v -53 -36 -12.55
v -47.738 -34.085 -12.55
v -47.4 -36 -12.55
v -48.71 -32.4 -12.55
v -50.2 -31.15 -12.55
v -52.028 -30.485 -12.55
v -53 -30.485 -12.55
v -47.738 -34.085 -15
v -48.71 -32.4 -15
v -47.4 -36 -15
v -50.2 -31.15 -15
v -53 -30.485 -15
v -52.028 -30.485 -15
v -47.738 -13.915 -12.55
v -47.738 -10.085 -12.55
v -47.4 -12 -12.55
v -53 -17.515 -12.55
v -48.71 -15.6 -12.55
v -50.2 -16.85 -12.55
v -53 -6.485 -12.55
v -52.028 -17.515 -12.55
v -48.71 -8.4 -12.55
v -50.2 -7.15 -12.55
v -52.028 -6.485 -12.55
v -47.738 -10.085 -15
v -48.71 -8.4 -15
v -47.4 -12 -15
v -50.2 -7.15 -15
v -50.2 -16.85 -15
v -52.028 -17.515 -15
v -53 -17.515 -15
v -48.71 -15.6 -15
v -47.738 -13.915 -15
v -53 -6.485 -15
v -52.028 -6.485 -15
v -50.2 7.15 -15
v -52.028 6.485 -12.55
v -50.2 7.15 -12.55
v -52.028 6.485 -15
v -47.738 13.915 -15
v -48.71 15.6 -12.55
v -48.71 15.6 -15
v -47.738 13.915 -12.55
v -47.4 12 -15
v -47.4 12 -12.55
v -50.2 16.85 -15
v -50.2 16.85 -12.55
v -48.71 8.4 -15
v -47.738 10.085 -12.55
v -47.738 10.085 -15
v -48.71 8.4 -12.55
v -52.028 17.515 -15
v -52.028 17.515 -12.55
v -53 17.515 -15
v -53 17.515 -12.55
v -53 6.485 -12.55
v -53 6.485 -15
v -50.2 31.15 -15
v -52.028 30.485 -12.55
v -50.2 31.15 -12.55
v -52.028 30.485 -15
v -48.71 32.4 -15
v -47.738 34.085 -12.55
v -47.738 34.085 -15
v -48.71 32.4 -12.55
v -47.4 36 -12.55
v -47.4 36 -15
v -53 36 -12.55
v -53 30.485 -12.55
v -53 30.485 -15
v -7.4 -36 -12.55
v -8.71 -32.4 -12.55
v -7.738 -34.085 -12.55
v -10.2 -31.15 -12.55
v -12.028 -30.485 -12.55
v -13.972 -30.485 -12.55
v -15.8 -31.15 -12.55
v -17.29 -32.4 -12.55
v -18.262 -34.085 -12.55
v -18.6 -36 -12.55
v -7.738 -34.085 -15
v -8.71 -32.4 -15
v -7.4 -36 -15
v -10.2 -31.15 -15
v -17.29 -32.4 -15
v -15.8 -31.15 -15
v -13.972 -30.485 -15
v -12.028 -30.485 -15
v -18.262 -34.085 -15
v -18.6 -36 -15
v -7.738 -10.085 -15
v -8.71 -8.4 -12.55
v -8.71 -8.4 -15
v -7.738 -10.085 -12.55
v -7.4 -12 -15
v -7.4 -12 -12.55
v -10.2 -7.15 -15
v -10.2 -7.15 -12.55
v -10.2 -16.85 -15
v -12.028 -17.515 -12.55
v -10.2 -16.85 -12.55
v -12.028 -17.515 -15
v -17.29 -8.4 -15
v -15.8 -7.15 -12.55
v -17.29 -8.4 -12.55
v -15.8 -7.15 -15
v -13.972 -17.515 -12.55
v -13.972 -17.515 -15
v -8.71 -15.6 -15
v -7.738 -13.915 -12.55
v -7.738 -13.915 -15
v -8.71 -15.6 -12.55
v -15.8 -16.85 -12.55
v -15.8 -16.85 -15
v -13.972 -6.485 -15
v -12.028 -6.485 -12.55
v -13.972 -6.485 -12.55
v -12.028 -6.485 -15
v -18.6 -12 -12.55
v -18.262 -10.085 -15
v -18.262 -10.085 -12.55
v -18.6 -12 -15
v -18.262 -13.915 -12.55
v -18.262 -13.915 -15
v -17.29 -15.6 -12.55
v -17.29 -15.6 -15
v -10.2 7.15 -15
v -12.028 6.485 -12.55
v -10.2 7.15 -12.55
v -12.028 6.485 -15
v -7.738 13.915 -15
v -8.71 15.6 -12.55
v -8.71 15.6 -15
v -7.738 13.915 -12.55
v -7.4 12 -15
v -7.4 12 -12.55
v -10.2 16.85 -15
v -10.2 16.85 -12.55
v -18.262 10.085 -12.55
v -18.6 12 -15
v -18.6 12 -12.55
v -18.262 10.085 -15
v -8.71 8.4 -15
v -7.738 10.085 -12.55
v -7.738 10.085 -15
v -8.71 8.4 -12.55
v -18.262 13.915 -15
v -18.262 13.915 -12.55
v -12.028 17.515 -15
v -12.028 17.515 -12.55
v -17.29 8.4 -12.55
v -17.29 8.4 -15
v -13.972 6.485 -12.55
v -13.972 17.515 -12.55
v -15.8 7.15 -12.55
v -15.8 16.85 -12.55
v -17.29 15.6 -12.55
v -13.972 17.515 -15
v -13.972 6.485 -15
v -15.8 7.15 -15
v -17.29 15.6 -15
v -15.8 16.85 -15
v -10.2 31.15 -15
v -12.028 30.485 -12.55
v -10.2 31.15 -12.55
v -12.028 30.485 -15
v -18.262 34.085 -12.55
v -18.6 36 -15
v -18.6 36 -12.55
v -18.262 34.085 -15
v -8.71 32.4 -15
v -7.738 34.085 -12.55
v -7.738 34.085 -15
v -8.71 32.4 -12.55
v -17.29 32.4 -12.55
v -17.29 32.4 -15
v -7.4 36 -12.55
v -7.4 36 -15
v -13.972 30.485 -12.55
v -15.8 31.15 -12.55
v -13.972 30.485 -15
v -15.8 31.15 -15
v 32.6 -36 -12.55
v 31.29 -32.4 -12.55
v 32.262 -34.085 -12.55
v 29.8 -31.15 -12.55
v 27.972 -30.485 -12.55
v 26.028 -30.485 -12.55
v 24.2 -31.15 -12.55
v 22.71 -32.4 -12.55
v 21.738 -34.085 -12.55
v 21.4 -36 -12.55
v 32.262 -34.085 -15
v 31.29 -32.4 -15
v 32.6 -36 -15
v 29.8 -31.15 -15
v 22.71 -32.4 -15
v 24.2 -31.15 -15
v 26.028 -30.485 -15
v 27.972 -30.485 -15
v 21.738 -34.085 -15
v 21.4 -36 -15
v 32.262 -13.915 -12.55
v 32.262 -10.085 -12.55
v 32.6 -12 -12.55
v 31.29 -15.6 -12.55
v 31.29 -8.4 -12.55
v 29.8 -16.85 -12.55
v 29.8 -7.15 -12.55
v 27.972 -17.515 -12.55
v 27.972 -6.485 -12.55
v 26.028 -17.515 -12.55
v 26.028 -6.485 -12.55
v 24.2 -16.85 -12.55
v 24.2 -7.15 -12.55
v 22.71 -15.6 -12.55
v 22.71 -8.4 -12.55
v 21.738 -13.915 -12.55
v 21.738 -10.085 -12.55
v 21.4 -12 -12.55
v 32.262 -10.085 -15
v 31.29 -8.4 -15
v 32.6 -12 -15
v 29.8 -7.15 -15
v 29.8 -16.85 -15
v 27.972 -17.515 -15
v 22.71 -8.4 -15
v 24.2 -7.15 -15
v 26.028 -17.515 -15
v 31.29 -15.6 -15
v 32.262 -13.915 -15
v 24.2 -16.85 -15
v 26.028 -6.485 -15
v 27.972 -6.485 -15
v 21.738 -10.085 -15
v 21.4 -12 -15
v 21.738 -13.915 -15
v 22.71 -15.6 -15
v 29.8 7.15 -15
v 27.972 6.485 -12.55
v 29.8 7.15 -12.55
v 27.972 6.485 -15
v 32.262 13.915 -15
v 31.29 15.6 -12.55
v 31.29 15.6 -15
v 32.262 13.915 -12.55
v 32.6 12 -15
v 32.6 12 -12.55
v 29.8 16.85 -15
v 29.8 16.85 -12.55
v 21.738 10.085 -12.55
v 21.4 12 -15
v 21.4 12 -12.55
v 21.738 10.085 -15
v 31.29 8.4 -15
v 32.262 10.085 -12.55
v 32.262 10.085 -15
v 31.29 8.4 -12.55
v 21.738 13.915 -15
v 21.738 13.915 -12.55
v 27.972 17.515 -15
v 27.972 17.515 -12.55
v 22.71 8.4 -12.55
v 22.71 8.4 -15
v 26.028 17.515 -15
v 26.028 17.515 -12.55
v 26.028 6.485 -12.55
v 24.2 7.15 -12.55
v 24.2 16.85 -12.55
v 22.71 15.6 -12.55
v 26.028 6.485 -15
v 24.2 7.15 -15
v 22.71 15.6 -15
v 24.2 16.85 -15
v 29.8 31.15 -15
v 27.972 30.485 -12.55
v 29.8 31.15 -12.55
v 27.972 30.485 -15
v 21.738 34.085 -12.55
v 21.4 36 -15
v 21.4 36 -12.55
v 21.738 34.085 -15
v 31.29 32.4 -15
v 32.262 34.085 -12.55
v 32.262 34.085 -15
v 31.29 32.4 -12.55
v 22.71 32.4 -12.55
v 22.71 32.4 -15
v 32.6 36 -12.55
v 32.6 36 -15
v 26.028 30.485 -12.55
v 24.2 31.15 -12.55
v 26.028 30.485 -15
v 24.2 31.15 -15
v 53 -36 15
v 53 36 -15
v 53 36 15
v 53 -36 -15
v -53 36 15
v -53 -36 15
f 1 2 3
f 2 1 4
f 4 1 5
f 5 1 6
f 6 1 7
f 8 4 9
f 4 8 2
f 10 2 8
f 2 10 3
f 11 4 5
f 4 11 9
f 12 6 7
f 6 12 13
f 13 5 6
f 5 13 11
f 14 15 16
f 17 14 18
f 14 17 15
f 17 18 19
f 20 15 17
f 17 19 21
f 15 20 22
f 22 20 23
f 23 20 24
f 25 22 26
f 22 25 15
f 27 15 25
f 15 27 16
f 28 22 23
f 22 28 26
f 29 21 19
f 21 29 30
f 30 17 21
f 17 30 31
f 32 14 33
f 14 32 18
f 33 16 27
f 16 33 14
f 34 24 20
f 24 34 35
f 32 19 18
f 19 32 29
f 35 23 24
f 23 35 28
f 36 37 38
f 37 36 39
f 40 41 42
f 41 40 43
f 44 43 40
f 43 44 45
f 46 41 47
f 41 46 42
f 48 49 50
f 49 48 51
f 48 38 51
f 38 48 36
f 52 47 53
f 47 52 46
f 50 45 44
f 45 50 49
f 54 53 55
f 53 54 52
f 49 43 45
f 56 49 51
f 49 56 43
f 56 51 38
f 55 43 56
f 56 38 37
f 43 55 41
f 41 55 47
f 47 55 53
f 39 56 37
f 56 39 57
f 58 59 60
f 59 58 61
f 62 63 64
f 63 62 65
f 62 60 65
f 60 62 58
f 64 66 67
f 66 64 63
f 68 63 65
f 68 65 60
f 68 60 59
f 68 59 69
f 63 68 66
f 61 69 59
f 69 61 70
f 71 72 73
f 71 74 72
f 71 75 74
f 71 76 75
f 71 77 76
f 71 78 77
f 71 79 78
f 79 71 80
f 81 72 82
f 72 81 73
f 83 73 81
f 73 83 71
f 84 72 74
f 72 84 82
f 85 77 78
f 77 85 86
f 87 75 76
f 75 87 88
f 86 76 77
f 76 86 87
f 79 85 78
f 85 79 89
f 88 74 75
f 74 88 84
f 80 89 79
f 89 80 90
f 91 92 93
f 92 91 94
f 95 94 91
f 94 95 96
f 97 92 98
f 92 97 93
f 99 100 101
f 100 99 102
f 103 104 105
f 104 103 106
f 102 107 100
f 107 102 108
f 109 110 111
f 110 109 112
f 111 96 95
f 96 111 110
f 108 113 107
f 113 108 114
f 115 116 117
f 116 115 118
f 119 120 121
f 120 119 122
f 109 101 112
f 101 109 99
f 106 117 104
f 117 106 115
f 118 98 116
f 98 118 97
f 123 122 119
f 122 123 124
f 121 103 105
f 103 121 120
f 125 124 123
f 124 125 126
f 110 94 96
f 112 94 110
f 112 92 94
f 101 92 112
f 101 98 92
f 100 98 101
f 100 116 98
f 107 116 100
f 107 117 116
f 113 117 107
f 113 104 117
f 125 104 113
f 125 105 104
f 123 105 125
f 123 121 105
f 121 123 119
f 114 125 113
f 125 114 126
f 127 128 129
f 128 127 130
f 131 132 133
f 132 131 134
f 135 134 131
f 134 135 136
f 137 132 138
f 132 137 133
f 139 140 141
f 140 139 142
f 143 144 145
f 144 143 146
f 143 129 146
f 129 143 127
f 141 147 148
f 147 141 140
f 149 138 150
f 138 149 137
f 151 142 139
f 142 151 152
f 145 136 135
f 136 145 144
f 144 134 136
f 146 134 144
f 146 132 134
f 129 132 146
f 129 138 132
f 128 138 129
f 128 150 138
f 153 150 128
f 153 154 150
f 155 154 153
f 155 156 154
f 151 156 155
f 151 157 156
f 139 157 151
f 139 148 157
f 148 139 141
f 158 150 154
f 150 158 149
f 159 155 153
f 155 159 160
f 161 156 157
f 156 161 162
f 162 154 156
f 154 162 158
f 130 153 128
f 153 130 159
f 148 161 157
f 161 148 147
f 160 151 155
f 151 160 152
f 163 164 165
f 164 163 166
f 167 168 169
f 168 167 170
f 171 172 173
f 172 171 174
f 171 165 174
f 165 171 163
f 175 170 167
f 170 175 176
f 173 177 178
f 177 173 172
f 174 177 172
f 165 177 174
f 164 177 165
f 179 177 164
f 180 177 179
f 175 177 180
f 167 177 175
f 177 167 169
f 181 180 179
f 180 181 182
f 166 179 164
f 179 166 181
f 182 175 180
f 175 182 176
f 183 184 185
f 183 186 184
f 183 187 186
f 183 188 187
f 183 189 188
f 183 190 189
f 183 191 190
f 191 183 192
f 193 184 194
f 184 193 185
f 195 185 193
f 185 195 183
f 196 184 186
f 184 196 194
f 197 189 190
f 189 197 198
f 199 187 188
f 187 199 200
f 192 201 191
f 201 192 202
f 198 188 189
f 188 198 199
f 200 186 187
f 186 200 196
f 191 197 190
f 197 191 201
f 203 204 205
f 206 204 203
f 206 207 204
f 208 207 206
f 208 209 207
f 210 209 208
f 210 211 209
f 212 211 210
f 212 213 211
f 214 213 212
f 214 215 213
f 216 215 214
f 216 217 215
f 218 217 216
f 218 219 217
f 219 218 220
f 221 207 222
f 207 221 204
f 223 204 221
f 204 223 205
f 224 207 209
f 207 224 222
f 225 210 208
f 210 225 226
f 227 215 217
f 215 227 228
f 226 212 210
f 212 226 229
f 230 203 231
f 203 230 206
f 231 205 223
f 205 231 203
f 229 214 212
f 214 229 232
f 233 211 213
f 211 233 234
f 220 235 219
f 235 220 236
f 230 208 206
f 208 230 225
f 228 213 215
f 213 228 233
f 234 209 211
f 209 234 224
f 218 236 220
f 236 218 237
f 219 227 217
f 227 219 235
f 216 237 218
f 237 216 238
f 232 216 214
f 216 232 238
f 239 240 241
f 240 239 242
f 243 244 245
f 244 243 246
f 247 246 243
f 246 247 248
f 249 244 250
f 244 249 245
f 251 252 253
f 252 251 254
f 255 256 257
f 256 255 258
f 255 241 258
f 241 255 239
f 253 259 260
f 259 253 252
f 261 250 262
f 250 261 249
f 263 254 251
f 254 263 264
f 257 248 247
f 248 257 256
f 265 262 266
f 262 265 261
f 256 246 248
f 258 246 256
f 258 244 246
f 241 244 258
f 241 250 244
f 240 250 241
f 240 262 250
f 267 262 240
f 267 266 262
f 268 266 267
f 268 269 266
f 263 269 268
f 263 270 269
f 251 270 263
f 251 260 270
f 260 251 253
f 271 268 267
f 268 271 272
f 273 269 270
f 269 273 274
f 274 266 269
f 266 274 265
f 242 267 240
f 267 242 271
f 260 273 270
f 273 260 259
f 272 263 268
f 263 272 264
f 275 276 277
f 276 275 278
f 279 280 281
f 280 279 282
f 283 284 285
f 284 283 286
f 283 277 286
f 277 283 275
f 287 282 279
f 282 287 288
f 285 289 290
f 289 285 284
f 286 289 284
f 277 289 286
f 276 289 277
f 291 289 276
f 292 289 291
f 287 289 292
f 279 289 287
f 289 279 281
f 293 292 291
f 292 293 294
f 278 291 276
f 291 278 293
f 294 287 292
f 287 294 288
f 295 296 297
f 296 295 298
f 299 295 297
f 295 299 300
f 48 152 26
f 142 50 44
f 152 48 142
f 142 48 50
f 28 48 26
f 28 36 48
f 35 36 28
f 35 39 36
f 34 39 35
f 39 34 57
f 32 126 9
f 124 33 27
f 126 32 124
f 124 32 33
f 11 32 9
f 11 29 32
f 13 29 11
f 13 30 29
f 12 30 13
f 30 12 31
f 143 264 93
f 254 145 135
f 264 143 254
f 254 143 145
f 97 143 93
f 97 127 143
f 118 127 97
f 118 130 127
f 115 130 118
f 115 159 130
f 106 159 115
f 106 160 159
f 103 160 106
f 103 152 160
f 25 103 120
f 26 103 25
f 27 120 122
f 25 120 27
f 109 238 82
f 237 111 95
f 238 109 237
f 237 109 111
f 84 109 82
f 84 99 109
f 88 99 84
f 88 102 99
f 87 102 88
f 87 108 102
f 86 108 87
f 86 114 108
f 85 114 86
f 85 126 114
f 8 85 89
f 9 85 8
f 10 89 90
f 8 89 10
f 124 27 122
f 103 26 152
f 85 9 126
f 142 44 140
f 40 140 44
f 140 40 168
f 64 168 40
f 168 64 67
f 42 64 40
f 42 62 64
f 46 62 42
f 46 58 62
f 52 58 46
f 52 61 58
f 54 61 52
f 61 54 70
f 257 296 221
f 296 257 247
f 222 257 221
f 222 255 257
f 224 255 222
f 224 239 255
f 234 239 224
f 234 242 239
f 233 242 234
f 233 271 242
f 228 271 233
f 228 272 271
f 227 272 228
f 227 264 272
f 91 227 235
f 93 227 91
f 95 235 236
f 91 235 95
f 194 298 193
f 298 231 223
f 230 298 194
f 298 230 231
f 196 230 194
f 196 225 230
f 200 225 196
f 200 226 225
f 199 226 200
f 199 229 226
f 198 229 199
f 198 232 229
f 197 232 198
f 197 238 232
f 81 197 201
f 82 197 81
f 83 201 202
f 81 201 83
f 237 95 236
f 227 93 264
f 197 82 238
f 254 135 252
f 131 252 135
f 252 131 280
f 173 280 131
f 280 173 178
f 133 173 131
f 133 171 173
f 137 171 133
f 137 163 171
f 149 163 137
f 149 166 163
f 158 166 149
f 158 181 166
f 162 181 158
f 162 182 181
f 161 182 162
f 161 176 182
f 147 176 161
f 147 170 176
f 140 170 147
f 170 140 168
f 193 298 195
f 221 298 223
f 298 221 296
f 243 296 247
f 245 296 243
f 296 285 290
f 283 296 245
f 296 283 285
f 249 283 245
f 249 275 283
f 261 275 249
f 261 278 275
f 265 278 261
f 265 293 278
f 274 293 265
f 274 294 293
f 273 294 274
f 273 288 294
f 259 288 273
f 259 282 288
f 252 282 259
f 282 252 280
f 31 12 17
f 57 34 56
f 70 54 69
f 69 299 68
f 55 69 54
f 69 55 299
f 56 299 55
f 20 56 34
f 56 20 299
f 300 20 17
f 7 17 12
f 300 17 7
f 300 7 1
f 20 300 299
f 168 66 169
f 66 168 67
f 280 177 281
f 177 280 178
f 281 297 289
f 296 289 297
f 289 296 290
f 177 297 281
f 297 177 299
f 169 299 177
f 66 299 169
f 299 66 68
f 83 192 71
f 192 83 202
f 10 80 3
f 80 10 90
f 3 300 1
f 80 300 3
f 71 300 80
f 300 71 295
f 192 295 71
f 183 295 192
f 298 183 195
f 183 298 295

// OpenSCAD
// Bench Rack for 1.5 mL Microcentrifuge Tubes
// Dimensions based on user specifications (mm)

// Block dimensions
$X_LEN = 106;
$Y_WID = 72;
$Z_TALL = 30;

// Grid parameters
$HOLE_COUNT_X = 6; // Along X axis
$HOLE_COUNT_Y = 4; // Along Y axis (rows)
$CC_SPACING_X = 16; // Centre-to-centre spacing along X
$CC_SPACING_Y = 16; // Centre-to-centre spacing along Y

// Hole parameters
$HOLE_DIAMETER = 11.2;
$HOLE_DEPTH = 25;   // Depth of the hole (open at top)
$FLOOR_HEIGHT = $Z_TALL - $HOLE_DEPTH; // Remaining solid floor height

// Geometry settings
$FN_CURVE = 64;      // Facets for smooth holes

// Calculate grid offset to center the array on the block face
// Total span X: (N-1) * spacing. Offset needed from edge is half of that + half spacing? 
// Actually, we want the first hole at a specific distance or perfectly centered?
// "Grid centred on the block" implies symmetry around Z=0 plane for Y and X centerline.
// Let's calculate position relative to -X/2 and -Y/2 (bottom-left corner of bounding box)

$OFFSET_X = (($HOLE_COUNT_X - 1) * $CC_SPACING_X / 2); 
$OFFSET_Y = (($HOLE_COUNT_Y - 1) * $CC_SPACING_Y / 2);

// Main block
difference() {
    // Create the solid rectangular block
    cube([
        $X_LEN, 
        $Y_WID, 
        $Z_TALL
    ], center=true);

    // Generate holes using a loop for repeated features
    // We iterate over X index (0 to 5) and Y row index (0 to 3)
    for(i = [0:$HOLE_COUNT_X - 1]) {
        for(j = [0:$HOLE_COUNT_Y - 1]) {
            
            // Calculate center position of this specific hole relative to block center
            $cx = ($OFFSET_X * i); 
            $cy = ($OFFSET_Y * j);

            // Create the cutting cylinder (hole)
            // Extend slightly past bottom face (-Z direction) to ensure clean cut in difference()
            $cut_depth = $HOLE_DEPTH + 0.1; 
            
            translate([
                -($X_LEN/2) + $cx, 
                -($Y_WID/2) + $cy, 
                -$cut_depth // Start below the block so it cuts through completely
            ]) {
                cylinder(
                    h = $HOLE_DEPTH + 0.1, // Slightly deeper than hole depth to clear floor in difference logic if needed, but here we just cut out volume
                    d = $HOLE_DIAMETER, 
                    center = true
                );
                
                // Note: In OpenSCAD 'difference', the cutter must be inside the solid.
                // Since our block is centered at 0, and cylinder is translated to absolute coords relative to origin?
                // Wait, translate([ -X/2 + cx ... ]) puts it in world coordinates where X_LEN/2 is right edge.
                // My translation logic above: 
                // Block center = (53, 36). 
                // Hole grid starts at offset from left/bottom edges? No, offsets calculated are relative to the start of the array.
                // Let's re-verify coordinate system.
                
                // Re-calculation for clarity inside loop:
                $pos_x = -($X_LEN/2) + ($OFFSET_X * i); 
                $pos_y = -($Y_WID/2) + ($OFFSET_Y * j);
            }
        }
    }
}

// Correction on the difference logic above: The cylinder command inside translate needs to be relative or absolute.
// If I use center=true, it centers around 0,0 of its own local space. Then I translate that origin.
// However, standard practice in OpenSCAD for holes is often simpler if we define positions correctly.

// Let's rewrite the difference block cleanly with correct coordinate math inside a single pass or corrected logic.
// The previous snippet had a logical error in how `translate` interacts with `cylinder(center=true)`.
// If cylinder has center=true, it spans from -d/2 to +d/2 relative to translation point.
// So translating by [pos_x, pos_y] places the hole correctly.

// Re-running the logic mentally:
// Block is centered at 0,0 in XY? No, `cube(..., center=true)` centers it at 0,0.
// The user said "centre it on the origin". So X range [-53, 53], Y range [-36, 36].
// Grid spacing 16mm. 
// If centered, the first hole (i=0) should be at -Offset + something?
// Let's define the grid such that it is symmetric around Z axis of block.
// Total width in X = $HOLE_COUNT_X * $CC_SPACING_X ? No, usually spacing is center-to-center.
// If we have 6 holes with 16mm pitch centered on a 106mm bar:
// Span = (6-1)*16 = 80mm. 
// Center of span should be at X=0.
// So first hole x_center = -40, last = +40? No.
// Let's assume the user wants a standard grid where holes are spaced by 16mm and the whole group is centered on the block face (XZ plane).
// Actually "grid centred on the block" usually means symmetric about X=0 and Y=0 planes of the block center.

$START_X = -($OFFSET_X); // Position of first hole relative to left edge? No.
// Let's calculate absolute positions from block center (0,0).
// Half span X = 4 * 16 = 64mm. 
// So holes are at x = -64, -48, ..., +64? That would make the outer hole edges touch or go out of bounds if radius is large enough.
// Radius = 5.6mm. Edge at -69.6 and -70.2 (approx). Block edge is -53. This fits easily inside 106mm width.

$POS_X_LIST = [];
for(i = [0:$HOLE_COUNT_X - 1]) {
    $x_val = ($OFFSET_X * i) - (($X_LEN/2) + ((($HOLE_COUNT_X-1)*$CC_SPACING_X)/2)); 
    // Wait, simpler way:
    // Center of the grid array is at X=0.
    // The first hole (i=0) should be at -(TotalSpan / 2).
    $x_val = -((($HOLE_COUNT_X-1)*$CC_SPACING_X)/2) + ($CC_SPACING_X * i); 
}

// Let's restart the code generation with a clean, verified script structure.
